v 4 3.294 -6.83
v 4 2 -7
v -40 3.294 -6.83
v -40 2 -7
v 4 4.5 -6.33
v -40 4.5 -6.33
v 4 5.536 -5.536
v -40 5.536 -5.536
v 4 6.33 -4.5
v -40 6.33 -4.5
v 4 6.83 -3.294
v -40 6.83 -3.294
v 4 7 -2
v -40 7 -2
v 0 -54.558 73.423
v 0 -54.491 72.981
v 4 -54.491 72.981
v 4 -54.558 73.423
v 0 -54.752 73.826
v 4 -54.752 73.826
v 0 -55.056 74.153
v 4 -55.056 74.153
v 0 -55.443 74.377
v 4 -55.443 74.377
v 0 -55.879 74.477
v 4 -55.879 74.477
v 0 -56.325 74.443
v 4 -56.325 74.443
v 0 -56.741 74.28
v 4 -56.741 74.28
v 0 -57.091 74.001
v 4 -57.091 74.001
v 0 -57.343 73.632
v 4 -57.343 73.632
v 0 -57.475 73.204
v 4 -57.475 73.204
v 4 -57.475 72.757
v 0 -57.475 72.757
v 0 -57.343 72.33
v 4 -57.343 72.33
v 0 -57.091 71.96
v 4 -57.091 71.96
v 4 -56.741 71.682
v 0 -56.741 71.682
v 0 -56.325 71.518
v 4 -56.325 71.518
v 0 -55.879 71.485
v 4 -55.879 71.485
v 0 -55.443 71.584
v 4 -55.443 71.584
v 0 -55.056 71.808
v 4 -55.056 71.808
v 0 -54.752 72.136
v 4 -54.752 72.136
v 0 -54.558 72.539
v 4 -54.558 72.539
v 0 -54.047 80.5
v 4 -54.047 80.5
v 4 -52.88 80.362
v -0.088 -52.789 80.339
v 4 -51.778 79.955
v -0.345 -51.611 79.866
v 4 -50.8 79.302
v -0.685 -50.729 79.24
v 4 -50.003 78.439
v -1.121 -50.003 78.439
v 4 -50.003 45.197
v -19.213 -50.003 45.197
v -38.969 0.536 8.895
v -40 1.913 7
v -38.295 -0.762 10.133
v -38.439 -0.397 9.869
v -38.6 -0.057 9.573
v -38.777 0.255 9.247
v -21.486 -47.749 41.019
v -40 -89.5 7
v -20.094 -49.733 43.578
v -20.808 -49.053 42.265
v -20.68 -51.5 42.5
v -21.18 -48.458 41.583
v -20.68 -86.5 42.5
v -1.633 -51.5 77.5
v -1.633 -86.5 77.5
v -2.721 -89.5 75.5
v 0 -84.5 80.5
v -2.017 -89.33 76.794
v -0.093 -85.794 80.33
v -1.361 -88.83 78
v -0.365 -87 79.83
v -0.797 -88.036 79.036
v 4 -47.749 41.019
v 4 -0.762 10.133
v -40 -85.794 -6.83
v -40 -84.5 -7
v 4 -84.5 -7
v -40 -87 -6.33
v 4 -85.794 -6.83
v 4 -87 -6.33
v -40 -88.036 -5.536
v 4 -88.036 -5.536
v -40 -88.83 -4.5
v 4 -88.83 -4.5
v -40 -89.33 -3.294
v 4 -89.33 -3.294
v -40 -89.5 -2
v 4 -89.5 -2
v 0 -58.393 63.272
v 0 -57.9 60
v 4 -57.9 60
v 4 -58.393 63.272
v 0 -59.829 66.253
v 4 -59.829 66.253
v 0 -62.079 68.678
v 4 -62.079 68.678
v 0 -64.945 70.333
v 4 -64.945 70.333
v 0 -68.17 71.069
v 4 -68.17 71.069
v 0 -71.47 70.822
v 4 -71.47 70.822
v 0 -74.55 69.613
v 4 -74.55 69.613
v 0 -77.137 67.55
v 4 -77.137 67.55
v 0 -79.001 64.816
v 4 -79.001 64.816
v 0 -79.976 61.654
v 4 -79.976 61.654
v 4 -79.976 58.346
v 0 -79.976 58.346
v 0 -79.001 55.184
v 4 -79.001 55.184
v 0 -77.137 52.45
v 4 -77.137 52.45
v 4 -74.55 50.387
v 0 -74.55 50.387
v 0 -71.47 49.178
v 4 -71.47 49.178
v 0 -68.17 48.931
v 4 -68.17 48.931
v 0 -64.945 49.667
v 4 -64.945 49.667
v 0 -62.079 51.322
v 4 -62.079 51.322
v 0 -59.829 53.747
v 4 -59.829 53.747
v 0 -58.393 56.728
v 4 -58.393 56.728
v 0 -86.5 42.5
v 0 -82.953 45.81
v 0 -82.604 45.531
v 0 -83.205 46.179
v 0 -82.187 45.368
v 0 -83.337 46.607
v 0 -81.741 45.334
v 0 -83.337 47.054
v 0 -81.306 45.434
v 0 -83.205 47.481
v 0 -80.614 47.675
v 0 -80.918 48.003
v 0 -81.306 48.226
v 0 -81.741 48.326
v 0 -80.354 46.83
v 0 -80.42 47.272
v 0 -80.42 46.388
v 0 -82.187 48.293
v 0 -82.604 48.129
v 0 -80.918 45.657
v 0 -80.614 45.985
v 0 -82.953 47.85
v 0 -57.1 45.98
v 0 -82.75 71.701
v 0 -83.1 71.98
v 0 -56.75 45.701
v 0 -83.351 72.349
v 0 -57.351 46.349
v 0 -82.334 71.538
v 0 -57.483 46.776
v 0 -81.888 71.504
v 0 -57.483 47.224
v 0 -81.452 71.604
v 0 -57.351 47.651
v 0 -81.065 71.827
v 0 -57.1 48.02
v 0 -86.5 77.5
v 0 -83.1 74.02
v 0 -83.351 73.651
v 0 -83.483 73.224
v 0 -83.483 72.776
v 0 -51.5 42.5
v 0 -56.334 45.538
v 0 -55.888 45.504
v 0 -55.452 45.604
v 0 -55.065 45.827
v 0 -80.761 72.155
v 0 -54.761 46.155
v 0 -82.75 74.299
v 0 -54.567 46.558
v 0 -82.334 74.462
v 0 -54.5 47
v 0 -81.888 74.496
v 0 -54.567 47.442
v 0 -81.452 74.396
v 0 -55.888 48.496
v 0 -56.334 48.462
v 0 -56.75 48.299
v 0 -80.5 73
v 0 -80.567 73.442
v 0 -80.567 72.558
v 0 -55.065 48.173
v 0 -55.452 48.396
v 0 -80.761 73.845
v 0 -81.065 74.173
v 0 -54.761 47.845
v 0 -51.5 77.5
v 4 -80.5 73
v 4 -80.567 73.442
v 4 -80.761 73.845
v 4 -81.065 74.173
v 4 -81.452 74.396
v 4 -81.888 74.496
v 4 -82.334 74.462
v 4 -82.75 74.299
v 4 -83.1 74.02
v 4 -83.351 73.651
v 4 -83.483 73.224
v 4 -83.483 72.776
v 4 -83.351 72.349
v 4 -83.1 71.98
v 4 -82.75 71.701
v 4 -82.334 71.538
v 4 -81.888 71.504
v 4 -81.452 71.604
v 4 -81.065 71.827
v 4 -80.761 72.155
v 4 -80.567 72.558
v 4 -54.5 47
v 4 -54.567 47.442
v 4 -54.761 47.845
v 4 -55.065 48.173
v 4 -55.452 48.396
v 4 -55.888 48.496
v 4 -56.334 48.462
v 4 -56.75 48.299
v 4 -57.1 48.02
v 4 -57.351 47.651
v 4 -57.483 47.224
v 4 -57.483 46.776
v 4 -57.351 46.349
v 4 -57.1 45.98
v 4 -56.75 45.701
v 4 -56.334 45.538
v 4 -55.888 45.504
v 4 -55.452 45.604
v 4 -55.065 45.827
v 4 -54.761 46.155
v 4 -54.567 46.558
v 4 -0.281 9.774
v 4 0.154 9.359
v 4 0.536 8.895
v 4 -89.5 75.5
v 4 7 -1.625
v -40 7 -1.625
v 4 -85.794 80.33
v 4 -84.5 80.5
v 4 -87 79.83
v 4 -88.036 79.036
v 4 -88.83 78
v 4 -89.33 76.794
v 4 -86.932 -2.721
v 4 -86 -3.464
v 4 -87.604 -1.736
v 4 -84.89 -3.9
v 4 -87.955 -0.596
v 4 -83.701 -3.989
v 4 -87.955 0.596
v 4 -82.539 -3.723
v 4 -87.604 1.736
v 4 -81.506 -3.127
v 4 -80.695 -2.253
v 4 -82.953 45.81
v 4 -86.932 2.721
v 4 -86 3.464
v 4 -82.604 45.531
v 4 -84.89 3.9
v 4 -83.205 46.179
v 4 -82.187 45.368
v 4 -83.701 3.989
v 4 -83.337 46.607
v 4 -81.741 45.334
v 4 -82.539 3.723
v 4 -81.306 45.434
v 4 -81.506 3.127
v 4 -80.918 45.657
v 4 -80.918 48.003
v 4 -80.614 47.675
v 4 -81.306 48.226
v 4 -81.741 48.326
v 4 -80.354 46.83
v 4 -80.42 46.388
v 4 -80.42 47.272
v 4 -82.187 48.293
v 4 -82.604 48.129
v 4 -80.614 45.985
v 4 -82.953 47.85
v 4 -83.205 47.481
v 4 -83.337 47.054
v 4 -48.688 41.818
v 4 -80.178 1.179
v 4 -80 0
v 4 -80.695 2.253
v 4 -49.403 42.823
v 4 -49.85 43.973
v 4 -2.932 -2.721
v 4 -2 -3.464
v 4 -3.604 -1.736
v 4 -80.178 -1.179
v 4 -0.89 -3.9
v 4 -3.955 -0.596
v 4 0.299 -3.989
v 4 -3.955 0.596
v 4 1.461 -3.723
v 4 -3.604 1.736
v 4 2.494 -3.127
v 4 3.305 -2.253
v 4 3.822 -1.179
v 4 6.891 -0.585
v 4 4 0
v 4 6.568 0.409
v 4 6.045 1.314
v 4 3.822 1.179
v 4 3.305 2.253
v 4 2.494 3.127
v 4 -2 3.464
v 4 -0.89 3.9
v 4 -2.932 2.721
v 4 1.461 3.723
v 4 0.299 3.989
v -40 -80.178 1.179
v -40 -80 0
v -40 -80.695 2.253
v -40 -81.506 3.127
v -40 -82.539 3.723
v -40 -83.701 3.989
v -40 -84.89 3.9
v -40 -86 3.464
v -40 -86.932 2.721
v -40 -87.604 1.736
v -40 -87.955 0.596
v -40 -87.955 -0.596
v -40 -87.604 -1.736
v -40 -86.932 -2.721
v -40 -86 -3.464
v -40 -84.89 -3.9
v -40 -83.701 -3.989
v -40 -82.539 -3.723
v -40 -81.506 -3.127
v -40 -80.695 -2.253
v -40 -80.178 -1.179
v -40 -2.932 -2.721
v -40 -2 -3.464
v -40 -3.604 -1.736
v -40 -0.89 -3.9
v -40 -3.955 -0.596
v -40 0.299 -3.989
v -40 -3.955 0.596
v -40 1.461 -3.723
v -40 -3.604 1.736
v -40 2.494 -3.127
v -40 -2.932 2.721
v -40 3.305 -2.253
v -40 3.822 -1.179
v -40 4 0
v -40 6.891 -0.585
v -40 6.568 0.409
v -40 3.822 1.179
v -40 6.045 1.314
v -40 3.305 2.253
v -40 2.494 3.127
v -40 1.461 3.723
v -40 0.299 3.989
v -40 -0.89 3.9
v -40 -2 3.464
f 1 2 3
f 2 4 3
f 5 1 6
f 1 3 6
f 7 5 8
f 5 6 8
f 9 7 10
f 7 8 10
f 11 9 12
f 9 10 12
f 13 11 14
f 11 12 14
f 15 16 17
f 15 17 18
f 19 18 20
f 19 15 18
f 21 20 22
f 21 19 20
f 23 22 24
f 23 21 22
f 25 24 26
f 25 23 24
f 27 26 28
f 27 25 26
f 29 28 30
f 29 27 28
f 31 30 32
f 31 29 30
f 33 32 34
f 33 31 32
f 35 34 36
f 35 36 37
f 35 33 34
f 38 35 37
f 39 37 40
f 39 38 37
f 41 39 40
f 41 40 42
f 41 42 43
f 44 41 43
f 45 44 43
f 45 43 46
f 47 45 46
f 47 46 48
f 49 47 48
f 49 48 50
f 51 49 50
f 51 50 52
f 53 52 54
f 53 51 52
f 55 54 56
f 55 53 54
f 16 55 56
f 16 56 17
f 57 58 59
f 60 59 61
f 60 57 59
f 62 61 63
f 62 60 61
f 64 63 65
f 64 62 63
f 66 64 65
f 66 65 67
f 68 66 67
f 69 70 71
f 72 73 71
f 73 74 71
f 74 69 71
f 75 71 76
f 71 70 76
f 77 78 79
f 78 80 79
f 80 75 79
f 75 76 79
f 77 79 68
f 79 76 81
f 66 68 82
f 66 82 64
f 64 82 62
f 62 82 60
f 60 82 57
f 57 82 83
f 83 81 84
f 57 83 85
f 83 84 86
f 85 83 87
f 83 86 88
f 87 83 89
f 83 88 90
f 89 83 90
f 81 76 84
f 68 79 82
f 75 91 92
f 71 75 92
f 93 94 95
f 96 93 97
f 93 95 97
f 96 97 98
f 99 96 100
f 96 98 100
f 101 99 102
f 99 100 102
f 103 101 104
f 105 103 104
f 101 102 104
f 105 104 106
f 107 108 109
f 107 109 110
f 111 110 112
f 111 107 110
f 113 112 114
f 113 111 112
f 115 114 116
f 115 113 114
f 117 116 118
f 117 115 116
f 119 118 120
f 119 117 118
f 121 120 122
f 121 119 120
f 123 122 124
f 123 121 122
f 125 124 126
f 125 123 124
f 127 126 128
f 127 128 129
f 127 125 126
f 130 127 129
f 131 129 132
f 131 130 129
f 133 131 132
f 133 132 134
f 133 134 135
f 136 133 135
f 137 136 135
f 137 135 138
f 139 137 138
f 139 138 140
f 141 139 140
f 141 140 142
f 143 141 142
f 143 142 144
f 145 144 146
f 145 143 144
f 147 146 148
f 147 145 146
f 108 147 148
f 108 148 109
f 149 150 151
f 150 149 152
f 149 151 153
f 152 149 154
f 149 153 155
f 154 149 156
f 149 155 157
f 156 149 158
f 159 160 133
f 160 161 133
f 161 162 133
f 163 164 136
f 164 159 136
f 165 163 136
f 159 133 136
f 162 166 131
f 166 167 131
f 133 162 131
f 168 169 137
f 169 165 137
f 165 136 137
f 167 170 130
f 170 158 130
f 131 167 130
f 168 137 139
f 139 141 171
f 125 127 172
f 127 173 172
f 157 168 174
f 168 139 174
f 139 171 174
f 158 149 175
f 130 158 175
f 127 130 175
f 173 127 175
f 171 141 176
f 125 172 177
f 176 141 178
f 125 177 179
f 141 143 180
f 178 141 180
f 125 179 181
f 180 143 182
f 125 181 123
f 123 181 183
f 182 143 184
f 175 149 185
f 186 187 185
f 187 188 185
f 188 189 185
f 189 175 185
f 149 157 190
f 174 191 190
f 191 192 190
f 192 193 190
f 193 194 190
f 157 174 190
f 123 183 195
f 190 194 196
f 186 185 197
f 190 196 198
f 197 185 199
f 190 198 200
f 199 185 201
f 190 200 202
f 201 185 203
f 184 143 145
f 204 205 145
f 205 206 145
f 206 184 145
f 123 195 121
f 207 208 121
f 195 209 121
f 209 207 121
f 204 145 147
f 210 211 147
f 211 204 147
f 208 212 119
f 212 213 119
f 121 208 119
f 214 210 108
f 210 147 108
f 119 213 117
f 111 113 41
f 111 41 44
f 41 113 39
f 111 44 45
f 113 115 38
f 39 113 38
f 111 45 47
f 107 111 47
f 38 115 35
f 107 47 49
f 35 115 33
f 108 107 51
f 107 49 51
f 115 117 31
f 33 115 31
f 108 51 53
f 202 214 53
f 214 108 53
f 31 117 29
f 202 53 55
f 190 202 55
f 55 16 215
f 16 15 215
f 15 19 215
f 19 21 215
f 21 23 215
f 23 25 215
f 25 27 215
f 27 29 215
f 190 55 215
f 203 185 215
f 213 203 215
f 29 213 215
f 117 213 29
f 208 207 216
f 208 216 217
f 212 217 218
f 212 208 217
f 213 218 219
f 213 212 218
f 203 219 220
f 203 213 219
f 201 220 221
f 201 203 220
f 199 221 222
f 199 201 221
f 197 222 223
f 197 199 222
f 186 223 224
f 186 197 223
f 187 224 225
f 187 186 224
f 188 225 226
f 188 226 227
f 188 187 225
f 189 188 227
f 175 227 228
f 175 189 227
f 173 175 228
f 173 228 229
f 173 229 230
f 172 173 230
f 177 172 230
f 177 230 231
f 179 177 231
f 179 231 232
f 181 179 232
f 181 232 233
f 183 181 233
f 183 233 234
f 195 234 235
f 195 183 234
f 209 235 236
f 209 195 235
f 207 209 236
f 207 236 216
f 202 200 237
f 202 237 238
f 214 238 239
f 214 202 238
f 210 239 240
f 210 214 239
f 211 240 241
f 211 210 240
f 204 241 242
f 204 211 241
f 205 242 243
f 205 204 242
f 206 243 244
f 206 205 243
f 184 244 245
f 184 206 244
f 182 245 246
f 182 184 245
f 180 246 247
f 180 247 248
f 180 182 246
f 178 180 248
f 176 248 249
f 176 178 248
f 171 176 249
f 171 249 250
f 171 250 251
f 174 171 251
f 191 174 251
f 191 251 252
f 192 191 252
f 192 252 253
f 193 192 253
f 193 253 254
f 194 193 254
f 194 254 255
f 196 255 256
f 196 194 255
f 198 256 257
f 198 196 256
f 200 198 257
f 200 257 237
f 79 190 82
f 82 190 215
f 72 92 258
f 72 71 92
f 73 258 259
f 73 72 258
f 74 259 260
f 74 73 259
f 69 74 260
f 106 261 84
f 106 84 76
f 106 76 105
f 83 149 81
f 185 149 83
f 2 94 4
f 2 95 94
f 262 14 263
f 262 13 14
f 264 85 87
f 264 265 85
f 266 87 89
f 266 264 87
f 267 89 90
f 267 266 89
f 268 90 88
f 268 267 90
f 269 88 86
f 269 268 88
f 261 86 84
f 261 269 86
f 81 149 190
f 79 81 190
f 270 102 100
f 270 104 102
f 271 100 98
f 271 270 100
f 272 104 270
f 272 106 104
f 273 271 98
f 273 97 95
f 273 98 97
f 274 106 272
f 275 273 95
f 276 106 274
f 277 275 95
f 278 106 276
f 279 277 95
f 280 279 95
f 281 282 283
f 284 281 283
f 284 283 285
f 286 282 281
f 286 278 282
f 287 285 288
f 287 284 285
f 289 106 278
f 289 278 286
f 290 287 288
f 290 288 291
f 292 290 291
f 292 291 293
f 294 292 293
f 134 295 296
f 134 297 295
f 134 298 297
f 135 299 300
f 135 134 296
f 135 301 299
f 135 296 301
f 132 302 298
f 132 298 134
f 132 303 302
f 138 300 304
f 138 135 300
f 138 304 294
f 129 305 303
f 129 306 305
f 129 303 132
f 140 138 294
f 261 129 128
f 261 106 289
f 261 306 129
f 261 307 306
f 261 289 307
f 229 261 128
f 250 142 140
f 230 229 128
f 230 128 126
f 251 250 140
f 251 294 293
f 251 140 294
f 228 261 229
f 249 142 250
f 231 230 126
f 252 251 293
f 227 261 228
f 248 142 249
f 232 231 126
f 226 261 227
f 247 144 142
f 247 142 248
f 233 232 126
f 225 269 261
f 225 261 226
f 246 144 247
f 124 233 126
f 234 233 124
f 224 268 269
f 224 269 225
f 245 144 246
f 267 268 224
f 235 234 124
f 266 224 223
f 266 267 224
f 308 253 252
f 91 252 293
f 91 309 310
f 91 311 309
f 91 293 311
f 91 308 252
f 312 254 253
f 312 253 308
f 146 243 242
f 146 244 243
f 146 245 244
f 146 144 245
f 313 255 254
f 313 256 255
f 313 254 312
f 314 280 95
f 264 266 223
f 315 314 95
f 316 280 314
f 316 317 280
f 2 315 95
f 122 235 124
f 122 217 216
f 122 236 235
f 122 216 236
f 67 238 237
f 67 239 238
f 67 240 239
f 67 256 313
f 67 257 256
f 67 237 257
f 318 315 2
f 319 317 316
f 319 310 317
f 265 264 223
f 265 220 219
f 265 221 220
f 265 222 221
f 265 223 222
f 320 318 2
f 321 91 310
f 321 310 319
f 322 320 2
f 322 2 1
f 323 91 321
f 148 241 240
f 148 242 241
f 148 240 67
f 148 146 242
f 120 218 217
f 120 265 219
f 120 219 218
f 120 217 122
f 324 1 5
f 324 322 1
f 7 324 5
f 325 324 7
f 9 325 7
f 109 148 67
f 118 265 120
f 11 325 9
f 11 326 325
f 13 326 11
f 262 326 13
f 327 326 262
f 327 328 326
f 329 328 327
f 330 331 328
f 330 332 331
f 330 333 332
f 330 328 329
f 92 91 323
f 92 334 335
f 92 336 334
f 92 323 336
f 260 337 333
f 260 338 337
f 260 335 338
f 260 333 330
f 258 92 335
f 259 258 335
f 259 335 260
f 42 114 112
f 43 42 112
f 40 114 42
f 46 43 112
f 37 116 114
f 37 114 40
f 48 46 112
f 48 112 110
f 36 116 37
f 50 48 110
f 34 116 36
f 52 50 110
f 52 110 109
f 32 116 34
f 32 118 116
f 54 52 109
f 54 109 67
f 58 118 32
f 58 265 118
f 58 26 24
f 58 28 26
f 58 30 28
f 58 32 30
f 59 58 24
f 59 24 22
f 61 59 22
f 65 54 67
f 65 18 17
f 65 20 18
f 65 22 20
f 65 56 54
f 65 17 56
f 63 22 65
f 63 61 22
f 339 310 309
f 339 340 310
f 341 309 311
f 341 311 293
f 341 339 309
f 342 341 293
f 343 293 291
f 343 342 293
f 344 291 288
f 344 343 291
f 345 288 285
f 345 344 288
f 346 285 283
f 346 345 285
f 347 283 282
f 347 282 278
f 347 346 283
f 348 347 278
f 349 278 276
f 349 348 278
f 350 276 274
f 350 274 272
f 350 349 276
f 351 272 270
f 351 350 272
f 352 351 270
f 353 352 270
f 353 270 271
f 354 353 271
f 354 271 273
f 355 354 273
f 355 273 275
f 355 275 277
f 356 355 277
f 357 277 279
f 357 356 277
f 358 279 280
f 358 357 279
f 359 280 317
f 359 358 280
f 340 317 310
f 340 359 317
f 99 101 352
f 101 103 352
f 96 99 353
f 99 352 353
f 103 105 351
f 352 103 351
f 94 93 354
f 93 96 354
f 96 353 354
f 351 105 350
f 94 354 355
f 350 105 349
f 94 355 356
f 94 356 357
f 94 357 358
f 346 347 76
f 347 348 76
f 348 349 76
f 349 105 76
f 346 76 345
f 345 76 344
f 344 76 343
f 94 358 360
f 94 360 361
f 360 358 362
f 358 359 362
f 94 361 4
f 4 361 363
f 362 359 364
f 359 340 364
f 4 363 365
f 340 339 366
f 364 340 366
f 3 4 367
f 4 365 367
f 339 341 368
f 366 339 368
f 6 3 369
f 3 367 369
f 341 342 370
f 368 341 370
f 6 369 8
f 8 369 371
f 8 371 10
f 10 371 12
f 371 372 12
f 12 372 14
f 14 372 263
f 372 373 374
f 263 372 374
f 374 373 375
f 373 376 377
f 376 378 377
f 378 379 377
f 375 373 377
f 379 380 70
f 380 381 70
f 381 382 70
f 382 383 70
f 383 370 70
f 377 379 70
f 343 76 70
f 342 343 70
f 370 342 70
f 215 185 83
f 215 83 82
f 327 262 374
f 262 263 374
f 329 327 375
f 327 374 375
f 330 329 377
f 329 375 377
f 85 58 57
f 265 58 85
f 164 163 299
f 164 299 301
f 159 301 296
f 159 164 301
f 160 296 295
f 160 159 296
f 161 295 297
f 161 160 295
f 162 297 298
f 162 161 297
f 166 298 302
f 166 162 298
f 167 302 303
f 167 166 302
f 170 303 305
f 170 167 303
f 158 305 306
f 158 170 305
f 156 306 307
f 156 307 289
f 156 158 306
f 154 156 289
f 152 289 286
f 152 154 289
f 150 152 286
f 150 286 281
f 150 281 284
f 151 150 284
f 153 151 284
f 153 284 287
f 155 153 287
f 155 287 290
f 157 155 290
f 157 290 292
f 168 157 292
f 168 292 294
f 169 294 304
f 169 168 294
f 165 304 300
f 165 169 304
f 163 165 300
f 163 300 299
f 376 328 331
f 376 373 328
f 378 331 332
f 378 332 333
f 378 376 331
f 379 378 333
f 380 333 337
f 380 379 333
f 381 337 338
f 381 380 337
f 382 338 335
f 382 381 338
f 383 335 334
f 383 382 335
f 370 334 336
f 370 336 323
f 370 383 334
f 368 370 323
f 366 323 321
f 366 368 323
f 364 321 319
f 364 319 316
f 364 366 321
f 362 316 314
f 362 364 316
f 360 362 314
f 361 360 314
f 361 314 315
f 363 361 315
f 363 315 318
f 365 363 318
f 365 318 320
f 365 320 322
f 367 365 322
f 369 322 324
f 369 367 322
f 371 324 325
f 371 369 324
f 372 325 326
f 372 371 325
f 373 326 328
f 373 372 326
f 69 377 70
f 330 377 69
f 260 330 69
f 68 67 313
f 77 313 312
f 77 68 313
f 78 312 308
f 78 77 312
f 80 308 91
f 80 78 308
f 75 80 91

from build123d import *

# Parameters (mm, degrees)
F0_R     = 4
F0_W     = 35
F0_H     = 35
F0_R_2   = 1.5
F0_R_3   = 11.1
F1_DEPTH = 4
F2_DEPTH = 40
F4_DEPTH = 96.501
F5_R     = 5
F7_DEPTH = 44.001
F9_DEPTH = 44.001
F10_R    = 5


with BuildPart() as f1:
    # F0 (on Right) → F1 (new body)
    with BuildSketch(Plane.YZ):
        Polygon((-51.5, 80.5), (-89.5, 80.5), (-89.5, -7), (7, -7), (7, 0), align=None)
        with Locations((-84, 0)):
            Circle(F0_R, mode=Mode.SUBTRACT)
        Circle(F0_R, mode=Mode.SUBTRACT)
        with Locations((-69, 60)):
            Rectangle(F0_W, F0_H, mode=Mode.SUBTRACT)
        with Locations((-69, 60)):
            Rectangle(F0_W, F0_H)
        with Locations((-81.8535834551, 46.8301847577)):
            Circle(F0_R_2, mode=Mode.SUBTRACT)
        with Locations((-56, 47)):
            Circle(F0_R_2, mode=Mode.SUBTRACT)
        with Locations((-69, 60)):
            Circle(F0_R_3, mode=Mode.SUBTRACT)
        with Locations((-82, 73)):
            Circle(F0_R_2, mode=Mode.SUBTRACT)
        with Locations((-55.9914708138, 72.9807242751)):
            Circle(F0_R_2, mode=Mode.SUBTRACT)
    extrude(amount=F1_DEPTH)

    # F0 (on Right) → F2 (join)
    with BuildSketch(Plane.YZ):
        Polygon((-51.5, 80.5), (-89.5, 80.5), (-89.5, -7), (7, -7), (7, 0), align=None)
        with Locations((-84, 0)):
            Circle(F0_R, mode=Mode.SUBTRACT)
        Circle(F0_R, mode=Mode.SUBTRACT)
        with Locations((-69, 60)):
            Rectangle(F0_W, F0_H, mode=Mode.SUBTRACT)
    extrude(amount=-F2_DEPTH)

    # F3 (on face) → F4 (cut, through all)
    with BuildSketch(Plane.XZ.offset(89.5)):
        Polygon((-40, 7), (0, 80.5), (-40, 80.5), align=None)
    extrude(amount=-F4_DEPTH, mode=Mode.SUBTRACT)

    # F5
    f5_edges = [f1.edges().sort_by_distance(p)[0] for p in [
        (-18, -89.5, -7),
        (-18, 7, -7),
        (-18, 7, 0),
        (2, -89.5, 80.5),
        (2, -51.5, 80.5),
    ]]
    fillet(f5_edges, radius=F5_R)

    # F6 (on face) → F7 (cut, through all)
    with BuildSketch(Plane.YZ.offset(4)):
        Polygon((-23.8850931677, 42.5), (-50.0025195443, 78.4393645012), (-50.0025195443, 42.5), align=None)
    extrude(amount=-F7_DEPTH, mode=Mode.SUBTRACT)

    # F8 (on face) → F9 (cut, through all)
    with BuildSketch(Plane.YZ.offset(4)):
        Polygon((0, 9.6324786325), (-23.8850931677, 42.5), (-50.0025195443, 42.5), align=None)
    extrude(amount=-F9_DEPTH, mode=Mode.SUBTRACT)

    # F10
    f10_edges = [f1.edges().sort_by_distance(p)[0] for p in [
        (-8.340136, -50.00252, 42.5),
        (-17.283679, 0, 9.632479),
    ]]
    fillet(f10_edges, radius=F10_R)


solid = f1.part
